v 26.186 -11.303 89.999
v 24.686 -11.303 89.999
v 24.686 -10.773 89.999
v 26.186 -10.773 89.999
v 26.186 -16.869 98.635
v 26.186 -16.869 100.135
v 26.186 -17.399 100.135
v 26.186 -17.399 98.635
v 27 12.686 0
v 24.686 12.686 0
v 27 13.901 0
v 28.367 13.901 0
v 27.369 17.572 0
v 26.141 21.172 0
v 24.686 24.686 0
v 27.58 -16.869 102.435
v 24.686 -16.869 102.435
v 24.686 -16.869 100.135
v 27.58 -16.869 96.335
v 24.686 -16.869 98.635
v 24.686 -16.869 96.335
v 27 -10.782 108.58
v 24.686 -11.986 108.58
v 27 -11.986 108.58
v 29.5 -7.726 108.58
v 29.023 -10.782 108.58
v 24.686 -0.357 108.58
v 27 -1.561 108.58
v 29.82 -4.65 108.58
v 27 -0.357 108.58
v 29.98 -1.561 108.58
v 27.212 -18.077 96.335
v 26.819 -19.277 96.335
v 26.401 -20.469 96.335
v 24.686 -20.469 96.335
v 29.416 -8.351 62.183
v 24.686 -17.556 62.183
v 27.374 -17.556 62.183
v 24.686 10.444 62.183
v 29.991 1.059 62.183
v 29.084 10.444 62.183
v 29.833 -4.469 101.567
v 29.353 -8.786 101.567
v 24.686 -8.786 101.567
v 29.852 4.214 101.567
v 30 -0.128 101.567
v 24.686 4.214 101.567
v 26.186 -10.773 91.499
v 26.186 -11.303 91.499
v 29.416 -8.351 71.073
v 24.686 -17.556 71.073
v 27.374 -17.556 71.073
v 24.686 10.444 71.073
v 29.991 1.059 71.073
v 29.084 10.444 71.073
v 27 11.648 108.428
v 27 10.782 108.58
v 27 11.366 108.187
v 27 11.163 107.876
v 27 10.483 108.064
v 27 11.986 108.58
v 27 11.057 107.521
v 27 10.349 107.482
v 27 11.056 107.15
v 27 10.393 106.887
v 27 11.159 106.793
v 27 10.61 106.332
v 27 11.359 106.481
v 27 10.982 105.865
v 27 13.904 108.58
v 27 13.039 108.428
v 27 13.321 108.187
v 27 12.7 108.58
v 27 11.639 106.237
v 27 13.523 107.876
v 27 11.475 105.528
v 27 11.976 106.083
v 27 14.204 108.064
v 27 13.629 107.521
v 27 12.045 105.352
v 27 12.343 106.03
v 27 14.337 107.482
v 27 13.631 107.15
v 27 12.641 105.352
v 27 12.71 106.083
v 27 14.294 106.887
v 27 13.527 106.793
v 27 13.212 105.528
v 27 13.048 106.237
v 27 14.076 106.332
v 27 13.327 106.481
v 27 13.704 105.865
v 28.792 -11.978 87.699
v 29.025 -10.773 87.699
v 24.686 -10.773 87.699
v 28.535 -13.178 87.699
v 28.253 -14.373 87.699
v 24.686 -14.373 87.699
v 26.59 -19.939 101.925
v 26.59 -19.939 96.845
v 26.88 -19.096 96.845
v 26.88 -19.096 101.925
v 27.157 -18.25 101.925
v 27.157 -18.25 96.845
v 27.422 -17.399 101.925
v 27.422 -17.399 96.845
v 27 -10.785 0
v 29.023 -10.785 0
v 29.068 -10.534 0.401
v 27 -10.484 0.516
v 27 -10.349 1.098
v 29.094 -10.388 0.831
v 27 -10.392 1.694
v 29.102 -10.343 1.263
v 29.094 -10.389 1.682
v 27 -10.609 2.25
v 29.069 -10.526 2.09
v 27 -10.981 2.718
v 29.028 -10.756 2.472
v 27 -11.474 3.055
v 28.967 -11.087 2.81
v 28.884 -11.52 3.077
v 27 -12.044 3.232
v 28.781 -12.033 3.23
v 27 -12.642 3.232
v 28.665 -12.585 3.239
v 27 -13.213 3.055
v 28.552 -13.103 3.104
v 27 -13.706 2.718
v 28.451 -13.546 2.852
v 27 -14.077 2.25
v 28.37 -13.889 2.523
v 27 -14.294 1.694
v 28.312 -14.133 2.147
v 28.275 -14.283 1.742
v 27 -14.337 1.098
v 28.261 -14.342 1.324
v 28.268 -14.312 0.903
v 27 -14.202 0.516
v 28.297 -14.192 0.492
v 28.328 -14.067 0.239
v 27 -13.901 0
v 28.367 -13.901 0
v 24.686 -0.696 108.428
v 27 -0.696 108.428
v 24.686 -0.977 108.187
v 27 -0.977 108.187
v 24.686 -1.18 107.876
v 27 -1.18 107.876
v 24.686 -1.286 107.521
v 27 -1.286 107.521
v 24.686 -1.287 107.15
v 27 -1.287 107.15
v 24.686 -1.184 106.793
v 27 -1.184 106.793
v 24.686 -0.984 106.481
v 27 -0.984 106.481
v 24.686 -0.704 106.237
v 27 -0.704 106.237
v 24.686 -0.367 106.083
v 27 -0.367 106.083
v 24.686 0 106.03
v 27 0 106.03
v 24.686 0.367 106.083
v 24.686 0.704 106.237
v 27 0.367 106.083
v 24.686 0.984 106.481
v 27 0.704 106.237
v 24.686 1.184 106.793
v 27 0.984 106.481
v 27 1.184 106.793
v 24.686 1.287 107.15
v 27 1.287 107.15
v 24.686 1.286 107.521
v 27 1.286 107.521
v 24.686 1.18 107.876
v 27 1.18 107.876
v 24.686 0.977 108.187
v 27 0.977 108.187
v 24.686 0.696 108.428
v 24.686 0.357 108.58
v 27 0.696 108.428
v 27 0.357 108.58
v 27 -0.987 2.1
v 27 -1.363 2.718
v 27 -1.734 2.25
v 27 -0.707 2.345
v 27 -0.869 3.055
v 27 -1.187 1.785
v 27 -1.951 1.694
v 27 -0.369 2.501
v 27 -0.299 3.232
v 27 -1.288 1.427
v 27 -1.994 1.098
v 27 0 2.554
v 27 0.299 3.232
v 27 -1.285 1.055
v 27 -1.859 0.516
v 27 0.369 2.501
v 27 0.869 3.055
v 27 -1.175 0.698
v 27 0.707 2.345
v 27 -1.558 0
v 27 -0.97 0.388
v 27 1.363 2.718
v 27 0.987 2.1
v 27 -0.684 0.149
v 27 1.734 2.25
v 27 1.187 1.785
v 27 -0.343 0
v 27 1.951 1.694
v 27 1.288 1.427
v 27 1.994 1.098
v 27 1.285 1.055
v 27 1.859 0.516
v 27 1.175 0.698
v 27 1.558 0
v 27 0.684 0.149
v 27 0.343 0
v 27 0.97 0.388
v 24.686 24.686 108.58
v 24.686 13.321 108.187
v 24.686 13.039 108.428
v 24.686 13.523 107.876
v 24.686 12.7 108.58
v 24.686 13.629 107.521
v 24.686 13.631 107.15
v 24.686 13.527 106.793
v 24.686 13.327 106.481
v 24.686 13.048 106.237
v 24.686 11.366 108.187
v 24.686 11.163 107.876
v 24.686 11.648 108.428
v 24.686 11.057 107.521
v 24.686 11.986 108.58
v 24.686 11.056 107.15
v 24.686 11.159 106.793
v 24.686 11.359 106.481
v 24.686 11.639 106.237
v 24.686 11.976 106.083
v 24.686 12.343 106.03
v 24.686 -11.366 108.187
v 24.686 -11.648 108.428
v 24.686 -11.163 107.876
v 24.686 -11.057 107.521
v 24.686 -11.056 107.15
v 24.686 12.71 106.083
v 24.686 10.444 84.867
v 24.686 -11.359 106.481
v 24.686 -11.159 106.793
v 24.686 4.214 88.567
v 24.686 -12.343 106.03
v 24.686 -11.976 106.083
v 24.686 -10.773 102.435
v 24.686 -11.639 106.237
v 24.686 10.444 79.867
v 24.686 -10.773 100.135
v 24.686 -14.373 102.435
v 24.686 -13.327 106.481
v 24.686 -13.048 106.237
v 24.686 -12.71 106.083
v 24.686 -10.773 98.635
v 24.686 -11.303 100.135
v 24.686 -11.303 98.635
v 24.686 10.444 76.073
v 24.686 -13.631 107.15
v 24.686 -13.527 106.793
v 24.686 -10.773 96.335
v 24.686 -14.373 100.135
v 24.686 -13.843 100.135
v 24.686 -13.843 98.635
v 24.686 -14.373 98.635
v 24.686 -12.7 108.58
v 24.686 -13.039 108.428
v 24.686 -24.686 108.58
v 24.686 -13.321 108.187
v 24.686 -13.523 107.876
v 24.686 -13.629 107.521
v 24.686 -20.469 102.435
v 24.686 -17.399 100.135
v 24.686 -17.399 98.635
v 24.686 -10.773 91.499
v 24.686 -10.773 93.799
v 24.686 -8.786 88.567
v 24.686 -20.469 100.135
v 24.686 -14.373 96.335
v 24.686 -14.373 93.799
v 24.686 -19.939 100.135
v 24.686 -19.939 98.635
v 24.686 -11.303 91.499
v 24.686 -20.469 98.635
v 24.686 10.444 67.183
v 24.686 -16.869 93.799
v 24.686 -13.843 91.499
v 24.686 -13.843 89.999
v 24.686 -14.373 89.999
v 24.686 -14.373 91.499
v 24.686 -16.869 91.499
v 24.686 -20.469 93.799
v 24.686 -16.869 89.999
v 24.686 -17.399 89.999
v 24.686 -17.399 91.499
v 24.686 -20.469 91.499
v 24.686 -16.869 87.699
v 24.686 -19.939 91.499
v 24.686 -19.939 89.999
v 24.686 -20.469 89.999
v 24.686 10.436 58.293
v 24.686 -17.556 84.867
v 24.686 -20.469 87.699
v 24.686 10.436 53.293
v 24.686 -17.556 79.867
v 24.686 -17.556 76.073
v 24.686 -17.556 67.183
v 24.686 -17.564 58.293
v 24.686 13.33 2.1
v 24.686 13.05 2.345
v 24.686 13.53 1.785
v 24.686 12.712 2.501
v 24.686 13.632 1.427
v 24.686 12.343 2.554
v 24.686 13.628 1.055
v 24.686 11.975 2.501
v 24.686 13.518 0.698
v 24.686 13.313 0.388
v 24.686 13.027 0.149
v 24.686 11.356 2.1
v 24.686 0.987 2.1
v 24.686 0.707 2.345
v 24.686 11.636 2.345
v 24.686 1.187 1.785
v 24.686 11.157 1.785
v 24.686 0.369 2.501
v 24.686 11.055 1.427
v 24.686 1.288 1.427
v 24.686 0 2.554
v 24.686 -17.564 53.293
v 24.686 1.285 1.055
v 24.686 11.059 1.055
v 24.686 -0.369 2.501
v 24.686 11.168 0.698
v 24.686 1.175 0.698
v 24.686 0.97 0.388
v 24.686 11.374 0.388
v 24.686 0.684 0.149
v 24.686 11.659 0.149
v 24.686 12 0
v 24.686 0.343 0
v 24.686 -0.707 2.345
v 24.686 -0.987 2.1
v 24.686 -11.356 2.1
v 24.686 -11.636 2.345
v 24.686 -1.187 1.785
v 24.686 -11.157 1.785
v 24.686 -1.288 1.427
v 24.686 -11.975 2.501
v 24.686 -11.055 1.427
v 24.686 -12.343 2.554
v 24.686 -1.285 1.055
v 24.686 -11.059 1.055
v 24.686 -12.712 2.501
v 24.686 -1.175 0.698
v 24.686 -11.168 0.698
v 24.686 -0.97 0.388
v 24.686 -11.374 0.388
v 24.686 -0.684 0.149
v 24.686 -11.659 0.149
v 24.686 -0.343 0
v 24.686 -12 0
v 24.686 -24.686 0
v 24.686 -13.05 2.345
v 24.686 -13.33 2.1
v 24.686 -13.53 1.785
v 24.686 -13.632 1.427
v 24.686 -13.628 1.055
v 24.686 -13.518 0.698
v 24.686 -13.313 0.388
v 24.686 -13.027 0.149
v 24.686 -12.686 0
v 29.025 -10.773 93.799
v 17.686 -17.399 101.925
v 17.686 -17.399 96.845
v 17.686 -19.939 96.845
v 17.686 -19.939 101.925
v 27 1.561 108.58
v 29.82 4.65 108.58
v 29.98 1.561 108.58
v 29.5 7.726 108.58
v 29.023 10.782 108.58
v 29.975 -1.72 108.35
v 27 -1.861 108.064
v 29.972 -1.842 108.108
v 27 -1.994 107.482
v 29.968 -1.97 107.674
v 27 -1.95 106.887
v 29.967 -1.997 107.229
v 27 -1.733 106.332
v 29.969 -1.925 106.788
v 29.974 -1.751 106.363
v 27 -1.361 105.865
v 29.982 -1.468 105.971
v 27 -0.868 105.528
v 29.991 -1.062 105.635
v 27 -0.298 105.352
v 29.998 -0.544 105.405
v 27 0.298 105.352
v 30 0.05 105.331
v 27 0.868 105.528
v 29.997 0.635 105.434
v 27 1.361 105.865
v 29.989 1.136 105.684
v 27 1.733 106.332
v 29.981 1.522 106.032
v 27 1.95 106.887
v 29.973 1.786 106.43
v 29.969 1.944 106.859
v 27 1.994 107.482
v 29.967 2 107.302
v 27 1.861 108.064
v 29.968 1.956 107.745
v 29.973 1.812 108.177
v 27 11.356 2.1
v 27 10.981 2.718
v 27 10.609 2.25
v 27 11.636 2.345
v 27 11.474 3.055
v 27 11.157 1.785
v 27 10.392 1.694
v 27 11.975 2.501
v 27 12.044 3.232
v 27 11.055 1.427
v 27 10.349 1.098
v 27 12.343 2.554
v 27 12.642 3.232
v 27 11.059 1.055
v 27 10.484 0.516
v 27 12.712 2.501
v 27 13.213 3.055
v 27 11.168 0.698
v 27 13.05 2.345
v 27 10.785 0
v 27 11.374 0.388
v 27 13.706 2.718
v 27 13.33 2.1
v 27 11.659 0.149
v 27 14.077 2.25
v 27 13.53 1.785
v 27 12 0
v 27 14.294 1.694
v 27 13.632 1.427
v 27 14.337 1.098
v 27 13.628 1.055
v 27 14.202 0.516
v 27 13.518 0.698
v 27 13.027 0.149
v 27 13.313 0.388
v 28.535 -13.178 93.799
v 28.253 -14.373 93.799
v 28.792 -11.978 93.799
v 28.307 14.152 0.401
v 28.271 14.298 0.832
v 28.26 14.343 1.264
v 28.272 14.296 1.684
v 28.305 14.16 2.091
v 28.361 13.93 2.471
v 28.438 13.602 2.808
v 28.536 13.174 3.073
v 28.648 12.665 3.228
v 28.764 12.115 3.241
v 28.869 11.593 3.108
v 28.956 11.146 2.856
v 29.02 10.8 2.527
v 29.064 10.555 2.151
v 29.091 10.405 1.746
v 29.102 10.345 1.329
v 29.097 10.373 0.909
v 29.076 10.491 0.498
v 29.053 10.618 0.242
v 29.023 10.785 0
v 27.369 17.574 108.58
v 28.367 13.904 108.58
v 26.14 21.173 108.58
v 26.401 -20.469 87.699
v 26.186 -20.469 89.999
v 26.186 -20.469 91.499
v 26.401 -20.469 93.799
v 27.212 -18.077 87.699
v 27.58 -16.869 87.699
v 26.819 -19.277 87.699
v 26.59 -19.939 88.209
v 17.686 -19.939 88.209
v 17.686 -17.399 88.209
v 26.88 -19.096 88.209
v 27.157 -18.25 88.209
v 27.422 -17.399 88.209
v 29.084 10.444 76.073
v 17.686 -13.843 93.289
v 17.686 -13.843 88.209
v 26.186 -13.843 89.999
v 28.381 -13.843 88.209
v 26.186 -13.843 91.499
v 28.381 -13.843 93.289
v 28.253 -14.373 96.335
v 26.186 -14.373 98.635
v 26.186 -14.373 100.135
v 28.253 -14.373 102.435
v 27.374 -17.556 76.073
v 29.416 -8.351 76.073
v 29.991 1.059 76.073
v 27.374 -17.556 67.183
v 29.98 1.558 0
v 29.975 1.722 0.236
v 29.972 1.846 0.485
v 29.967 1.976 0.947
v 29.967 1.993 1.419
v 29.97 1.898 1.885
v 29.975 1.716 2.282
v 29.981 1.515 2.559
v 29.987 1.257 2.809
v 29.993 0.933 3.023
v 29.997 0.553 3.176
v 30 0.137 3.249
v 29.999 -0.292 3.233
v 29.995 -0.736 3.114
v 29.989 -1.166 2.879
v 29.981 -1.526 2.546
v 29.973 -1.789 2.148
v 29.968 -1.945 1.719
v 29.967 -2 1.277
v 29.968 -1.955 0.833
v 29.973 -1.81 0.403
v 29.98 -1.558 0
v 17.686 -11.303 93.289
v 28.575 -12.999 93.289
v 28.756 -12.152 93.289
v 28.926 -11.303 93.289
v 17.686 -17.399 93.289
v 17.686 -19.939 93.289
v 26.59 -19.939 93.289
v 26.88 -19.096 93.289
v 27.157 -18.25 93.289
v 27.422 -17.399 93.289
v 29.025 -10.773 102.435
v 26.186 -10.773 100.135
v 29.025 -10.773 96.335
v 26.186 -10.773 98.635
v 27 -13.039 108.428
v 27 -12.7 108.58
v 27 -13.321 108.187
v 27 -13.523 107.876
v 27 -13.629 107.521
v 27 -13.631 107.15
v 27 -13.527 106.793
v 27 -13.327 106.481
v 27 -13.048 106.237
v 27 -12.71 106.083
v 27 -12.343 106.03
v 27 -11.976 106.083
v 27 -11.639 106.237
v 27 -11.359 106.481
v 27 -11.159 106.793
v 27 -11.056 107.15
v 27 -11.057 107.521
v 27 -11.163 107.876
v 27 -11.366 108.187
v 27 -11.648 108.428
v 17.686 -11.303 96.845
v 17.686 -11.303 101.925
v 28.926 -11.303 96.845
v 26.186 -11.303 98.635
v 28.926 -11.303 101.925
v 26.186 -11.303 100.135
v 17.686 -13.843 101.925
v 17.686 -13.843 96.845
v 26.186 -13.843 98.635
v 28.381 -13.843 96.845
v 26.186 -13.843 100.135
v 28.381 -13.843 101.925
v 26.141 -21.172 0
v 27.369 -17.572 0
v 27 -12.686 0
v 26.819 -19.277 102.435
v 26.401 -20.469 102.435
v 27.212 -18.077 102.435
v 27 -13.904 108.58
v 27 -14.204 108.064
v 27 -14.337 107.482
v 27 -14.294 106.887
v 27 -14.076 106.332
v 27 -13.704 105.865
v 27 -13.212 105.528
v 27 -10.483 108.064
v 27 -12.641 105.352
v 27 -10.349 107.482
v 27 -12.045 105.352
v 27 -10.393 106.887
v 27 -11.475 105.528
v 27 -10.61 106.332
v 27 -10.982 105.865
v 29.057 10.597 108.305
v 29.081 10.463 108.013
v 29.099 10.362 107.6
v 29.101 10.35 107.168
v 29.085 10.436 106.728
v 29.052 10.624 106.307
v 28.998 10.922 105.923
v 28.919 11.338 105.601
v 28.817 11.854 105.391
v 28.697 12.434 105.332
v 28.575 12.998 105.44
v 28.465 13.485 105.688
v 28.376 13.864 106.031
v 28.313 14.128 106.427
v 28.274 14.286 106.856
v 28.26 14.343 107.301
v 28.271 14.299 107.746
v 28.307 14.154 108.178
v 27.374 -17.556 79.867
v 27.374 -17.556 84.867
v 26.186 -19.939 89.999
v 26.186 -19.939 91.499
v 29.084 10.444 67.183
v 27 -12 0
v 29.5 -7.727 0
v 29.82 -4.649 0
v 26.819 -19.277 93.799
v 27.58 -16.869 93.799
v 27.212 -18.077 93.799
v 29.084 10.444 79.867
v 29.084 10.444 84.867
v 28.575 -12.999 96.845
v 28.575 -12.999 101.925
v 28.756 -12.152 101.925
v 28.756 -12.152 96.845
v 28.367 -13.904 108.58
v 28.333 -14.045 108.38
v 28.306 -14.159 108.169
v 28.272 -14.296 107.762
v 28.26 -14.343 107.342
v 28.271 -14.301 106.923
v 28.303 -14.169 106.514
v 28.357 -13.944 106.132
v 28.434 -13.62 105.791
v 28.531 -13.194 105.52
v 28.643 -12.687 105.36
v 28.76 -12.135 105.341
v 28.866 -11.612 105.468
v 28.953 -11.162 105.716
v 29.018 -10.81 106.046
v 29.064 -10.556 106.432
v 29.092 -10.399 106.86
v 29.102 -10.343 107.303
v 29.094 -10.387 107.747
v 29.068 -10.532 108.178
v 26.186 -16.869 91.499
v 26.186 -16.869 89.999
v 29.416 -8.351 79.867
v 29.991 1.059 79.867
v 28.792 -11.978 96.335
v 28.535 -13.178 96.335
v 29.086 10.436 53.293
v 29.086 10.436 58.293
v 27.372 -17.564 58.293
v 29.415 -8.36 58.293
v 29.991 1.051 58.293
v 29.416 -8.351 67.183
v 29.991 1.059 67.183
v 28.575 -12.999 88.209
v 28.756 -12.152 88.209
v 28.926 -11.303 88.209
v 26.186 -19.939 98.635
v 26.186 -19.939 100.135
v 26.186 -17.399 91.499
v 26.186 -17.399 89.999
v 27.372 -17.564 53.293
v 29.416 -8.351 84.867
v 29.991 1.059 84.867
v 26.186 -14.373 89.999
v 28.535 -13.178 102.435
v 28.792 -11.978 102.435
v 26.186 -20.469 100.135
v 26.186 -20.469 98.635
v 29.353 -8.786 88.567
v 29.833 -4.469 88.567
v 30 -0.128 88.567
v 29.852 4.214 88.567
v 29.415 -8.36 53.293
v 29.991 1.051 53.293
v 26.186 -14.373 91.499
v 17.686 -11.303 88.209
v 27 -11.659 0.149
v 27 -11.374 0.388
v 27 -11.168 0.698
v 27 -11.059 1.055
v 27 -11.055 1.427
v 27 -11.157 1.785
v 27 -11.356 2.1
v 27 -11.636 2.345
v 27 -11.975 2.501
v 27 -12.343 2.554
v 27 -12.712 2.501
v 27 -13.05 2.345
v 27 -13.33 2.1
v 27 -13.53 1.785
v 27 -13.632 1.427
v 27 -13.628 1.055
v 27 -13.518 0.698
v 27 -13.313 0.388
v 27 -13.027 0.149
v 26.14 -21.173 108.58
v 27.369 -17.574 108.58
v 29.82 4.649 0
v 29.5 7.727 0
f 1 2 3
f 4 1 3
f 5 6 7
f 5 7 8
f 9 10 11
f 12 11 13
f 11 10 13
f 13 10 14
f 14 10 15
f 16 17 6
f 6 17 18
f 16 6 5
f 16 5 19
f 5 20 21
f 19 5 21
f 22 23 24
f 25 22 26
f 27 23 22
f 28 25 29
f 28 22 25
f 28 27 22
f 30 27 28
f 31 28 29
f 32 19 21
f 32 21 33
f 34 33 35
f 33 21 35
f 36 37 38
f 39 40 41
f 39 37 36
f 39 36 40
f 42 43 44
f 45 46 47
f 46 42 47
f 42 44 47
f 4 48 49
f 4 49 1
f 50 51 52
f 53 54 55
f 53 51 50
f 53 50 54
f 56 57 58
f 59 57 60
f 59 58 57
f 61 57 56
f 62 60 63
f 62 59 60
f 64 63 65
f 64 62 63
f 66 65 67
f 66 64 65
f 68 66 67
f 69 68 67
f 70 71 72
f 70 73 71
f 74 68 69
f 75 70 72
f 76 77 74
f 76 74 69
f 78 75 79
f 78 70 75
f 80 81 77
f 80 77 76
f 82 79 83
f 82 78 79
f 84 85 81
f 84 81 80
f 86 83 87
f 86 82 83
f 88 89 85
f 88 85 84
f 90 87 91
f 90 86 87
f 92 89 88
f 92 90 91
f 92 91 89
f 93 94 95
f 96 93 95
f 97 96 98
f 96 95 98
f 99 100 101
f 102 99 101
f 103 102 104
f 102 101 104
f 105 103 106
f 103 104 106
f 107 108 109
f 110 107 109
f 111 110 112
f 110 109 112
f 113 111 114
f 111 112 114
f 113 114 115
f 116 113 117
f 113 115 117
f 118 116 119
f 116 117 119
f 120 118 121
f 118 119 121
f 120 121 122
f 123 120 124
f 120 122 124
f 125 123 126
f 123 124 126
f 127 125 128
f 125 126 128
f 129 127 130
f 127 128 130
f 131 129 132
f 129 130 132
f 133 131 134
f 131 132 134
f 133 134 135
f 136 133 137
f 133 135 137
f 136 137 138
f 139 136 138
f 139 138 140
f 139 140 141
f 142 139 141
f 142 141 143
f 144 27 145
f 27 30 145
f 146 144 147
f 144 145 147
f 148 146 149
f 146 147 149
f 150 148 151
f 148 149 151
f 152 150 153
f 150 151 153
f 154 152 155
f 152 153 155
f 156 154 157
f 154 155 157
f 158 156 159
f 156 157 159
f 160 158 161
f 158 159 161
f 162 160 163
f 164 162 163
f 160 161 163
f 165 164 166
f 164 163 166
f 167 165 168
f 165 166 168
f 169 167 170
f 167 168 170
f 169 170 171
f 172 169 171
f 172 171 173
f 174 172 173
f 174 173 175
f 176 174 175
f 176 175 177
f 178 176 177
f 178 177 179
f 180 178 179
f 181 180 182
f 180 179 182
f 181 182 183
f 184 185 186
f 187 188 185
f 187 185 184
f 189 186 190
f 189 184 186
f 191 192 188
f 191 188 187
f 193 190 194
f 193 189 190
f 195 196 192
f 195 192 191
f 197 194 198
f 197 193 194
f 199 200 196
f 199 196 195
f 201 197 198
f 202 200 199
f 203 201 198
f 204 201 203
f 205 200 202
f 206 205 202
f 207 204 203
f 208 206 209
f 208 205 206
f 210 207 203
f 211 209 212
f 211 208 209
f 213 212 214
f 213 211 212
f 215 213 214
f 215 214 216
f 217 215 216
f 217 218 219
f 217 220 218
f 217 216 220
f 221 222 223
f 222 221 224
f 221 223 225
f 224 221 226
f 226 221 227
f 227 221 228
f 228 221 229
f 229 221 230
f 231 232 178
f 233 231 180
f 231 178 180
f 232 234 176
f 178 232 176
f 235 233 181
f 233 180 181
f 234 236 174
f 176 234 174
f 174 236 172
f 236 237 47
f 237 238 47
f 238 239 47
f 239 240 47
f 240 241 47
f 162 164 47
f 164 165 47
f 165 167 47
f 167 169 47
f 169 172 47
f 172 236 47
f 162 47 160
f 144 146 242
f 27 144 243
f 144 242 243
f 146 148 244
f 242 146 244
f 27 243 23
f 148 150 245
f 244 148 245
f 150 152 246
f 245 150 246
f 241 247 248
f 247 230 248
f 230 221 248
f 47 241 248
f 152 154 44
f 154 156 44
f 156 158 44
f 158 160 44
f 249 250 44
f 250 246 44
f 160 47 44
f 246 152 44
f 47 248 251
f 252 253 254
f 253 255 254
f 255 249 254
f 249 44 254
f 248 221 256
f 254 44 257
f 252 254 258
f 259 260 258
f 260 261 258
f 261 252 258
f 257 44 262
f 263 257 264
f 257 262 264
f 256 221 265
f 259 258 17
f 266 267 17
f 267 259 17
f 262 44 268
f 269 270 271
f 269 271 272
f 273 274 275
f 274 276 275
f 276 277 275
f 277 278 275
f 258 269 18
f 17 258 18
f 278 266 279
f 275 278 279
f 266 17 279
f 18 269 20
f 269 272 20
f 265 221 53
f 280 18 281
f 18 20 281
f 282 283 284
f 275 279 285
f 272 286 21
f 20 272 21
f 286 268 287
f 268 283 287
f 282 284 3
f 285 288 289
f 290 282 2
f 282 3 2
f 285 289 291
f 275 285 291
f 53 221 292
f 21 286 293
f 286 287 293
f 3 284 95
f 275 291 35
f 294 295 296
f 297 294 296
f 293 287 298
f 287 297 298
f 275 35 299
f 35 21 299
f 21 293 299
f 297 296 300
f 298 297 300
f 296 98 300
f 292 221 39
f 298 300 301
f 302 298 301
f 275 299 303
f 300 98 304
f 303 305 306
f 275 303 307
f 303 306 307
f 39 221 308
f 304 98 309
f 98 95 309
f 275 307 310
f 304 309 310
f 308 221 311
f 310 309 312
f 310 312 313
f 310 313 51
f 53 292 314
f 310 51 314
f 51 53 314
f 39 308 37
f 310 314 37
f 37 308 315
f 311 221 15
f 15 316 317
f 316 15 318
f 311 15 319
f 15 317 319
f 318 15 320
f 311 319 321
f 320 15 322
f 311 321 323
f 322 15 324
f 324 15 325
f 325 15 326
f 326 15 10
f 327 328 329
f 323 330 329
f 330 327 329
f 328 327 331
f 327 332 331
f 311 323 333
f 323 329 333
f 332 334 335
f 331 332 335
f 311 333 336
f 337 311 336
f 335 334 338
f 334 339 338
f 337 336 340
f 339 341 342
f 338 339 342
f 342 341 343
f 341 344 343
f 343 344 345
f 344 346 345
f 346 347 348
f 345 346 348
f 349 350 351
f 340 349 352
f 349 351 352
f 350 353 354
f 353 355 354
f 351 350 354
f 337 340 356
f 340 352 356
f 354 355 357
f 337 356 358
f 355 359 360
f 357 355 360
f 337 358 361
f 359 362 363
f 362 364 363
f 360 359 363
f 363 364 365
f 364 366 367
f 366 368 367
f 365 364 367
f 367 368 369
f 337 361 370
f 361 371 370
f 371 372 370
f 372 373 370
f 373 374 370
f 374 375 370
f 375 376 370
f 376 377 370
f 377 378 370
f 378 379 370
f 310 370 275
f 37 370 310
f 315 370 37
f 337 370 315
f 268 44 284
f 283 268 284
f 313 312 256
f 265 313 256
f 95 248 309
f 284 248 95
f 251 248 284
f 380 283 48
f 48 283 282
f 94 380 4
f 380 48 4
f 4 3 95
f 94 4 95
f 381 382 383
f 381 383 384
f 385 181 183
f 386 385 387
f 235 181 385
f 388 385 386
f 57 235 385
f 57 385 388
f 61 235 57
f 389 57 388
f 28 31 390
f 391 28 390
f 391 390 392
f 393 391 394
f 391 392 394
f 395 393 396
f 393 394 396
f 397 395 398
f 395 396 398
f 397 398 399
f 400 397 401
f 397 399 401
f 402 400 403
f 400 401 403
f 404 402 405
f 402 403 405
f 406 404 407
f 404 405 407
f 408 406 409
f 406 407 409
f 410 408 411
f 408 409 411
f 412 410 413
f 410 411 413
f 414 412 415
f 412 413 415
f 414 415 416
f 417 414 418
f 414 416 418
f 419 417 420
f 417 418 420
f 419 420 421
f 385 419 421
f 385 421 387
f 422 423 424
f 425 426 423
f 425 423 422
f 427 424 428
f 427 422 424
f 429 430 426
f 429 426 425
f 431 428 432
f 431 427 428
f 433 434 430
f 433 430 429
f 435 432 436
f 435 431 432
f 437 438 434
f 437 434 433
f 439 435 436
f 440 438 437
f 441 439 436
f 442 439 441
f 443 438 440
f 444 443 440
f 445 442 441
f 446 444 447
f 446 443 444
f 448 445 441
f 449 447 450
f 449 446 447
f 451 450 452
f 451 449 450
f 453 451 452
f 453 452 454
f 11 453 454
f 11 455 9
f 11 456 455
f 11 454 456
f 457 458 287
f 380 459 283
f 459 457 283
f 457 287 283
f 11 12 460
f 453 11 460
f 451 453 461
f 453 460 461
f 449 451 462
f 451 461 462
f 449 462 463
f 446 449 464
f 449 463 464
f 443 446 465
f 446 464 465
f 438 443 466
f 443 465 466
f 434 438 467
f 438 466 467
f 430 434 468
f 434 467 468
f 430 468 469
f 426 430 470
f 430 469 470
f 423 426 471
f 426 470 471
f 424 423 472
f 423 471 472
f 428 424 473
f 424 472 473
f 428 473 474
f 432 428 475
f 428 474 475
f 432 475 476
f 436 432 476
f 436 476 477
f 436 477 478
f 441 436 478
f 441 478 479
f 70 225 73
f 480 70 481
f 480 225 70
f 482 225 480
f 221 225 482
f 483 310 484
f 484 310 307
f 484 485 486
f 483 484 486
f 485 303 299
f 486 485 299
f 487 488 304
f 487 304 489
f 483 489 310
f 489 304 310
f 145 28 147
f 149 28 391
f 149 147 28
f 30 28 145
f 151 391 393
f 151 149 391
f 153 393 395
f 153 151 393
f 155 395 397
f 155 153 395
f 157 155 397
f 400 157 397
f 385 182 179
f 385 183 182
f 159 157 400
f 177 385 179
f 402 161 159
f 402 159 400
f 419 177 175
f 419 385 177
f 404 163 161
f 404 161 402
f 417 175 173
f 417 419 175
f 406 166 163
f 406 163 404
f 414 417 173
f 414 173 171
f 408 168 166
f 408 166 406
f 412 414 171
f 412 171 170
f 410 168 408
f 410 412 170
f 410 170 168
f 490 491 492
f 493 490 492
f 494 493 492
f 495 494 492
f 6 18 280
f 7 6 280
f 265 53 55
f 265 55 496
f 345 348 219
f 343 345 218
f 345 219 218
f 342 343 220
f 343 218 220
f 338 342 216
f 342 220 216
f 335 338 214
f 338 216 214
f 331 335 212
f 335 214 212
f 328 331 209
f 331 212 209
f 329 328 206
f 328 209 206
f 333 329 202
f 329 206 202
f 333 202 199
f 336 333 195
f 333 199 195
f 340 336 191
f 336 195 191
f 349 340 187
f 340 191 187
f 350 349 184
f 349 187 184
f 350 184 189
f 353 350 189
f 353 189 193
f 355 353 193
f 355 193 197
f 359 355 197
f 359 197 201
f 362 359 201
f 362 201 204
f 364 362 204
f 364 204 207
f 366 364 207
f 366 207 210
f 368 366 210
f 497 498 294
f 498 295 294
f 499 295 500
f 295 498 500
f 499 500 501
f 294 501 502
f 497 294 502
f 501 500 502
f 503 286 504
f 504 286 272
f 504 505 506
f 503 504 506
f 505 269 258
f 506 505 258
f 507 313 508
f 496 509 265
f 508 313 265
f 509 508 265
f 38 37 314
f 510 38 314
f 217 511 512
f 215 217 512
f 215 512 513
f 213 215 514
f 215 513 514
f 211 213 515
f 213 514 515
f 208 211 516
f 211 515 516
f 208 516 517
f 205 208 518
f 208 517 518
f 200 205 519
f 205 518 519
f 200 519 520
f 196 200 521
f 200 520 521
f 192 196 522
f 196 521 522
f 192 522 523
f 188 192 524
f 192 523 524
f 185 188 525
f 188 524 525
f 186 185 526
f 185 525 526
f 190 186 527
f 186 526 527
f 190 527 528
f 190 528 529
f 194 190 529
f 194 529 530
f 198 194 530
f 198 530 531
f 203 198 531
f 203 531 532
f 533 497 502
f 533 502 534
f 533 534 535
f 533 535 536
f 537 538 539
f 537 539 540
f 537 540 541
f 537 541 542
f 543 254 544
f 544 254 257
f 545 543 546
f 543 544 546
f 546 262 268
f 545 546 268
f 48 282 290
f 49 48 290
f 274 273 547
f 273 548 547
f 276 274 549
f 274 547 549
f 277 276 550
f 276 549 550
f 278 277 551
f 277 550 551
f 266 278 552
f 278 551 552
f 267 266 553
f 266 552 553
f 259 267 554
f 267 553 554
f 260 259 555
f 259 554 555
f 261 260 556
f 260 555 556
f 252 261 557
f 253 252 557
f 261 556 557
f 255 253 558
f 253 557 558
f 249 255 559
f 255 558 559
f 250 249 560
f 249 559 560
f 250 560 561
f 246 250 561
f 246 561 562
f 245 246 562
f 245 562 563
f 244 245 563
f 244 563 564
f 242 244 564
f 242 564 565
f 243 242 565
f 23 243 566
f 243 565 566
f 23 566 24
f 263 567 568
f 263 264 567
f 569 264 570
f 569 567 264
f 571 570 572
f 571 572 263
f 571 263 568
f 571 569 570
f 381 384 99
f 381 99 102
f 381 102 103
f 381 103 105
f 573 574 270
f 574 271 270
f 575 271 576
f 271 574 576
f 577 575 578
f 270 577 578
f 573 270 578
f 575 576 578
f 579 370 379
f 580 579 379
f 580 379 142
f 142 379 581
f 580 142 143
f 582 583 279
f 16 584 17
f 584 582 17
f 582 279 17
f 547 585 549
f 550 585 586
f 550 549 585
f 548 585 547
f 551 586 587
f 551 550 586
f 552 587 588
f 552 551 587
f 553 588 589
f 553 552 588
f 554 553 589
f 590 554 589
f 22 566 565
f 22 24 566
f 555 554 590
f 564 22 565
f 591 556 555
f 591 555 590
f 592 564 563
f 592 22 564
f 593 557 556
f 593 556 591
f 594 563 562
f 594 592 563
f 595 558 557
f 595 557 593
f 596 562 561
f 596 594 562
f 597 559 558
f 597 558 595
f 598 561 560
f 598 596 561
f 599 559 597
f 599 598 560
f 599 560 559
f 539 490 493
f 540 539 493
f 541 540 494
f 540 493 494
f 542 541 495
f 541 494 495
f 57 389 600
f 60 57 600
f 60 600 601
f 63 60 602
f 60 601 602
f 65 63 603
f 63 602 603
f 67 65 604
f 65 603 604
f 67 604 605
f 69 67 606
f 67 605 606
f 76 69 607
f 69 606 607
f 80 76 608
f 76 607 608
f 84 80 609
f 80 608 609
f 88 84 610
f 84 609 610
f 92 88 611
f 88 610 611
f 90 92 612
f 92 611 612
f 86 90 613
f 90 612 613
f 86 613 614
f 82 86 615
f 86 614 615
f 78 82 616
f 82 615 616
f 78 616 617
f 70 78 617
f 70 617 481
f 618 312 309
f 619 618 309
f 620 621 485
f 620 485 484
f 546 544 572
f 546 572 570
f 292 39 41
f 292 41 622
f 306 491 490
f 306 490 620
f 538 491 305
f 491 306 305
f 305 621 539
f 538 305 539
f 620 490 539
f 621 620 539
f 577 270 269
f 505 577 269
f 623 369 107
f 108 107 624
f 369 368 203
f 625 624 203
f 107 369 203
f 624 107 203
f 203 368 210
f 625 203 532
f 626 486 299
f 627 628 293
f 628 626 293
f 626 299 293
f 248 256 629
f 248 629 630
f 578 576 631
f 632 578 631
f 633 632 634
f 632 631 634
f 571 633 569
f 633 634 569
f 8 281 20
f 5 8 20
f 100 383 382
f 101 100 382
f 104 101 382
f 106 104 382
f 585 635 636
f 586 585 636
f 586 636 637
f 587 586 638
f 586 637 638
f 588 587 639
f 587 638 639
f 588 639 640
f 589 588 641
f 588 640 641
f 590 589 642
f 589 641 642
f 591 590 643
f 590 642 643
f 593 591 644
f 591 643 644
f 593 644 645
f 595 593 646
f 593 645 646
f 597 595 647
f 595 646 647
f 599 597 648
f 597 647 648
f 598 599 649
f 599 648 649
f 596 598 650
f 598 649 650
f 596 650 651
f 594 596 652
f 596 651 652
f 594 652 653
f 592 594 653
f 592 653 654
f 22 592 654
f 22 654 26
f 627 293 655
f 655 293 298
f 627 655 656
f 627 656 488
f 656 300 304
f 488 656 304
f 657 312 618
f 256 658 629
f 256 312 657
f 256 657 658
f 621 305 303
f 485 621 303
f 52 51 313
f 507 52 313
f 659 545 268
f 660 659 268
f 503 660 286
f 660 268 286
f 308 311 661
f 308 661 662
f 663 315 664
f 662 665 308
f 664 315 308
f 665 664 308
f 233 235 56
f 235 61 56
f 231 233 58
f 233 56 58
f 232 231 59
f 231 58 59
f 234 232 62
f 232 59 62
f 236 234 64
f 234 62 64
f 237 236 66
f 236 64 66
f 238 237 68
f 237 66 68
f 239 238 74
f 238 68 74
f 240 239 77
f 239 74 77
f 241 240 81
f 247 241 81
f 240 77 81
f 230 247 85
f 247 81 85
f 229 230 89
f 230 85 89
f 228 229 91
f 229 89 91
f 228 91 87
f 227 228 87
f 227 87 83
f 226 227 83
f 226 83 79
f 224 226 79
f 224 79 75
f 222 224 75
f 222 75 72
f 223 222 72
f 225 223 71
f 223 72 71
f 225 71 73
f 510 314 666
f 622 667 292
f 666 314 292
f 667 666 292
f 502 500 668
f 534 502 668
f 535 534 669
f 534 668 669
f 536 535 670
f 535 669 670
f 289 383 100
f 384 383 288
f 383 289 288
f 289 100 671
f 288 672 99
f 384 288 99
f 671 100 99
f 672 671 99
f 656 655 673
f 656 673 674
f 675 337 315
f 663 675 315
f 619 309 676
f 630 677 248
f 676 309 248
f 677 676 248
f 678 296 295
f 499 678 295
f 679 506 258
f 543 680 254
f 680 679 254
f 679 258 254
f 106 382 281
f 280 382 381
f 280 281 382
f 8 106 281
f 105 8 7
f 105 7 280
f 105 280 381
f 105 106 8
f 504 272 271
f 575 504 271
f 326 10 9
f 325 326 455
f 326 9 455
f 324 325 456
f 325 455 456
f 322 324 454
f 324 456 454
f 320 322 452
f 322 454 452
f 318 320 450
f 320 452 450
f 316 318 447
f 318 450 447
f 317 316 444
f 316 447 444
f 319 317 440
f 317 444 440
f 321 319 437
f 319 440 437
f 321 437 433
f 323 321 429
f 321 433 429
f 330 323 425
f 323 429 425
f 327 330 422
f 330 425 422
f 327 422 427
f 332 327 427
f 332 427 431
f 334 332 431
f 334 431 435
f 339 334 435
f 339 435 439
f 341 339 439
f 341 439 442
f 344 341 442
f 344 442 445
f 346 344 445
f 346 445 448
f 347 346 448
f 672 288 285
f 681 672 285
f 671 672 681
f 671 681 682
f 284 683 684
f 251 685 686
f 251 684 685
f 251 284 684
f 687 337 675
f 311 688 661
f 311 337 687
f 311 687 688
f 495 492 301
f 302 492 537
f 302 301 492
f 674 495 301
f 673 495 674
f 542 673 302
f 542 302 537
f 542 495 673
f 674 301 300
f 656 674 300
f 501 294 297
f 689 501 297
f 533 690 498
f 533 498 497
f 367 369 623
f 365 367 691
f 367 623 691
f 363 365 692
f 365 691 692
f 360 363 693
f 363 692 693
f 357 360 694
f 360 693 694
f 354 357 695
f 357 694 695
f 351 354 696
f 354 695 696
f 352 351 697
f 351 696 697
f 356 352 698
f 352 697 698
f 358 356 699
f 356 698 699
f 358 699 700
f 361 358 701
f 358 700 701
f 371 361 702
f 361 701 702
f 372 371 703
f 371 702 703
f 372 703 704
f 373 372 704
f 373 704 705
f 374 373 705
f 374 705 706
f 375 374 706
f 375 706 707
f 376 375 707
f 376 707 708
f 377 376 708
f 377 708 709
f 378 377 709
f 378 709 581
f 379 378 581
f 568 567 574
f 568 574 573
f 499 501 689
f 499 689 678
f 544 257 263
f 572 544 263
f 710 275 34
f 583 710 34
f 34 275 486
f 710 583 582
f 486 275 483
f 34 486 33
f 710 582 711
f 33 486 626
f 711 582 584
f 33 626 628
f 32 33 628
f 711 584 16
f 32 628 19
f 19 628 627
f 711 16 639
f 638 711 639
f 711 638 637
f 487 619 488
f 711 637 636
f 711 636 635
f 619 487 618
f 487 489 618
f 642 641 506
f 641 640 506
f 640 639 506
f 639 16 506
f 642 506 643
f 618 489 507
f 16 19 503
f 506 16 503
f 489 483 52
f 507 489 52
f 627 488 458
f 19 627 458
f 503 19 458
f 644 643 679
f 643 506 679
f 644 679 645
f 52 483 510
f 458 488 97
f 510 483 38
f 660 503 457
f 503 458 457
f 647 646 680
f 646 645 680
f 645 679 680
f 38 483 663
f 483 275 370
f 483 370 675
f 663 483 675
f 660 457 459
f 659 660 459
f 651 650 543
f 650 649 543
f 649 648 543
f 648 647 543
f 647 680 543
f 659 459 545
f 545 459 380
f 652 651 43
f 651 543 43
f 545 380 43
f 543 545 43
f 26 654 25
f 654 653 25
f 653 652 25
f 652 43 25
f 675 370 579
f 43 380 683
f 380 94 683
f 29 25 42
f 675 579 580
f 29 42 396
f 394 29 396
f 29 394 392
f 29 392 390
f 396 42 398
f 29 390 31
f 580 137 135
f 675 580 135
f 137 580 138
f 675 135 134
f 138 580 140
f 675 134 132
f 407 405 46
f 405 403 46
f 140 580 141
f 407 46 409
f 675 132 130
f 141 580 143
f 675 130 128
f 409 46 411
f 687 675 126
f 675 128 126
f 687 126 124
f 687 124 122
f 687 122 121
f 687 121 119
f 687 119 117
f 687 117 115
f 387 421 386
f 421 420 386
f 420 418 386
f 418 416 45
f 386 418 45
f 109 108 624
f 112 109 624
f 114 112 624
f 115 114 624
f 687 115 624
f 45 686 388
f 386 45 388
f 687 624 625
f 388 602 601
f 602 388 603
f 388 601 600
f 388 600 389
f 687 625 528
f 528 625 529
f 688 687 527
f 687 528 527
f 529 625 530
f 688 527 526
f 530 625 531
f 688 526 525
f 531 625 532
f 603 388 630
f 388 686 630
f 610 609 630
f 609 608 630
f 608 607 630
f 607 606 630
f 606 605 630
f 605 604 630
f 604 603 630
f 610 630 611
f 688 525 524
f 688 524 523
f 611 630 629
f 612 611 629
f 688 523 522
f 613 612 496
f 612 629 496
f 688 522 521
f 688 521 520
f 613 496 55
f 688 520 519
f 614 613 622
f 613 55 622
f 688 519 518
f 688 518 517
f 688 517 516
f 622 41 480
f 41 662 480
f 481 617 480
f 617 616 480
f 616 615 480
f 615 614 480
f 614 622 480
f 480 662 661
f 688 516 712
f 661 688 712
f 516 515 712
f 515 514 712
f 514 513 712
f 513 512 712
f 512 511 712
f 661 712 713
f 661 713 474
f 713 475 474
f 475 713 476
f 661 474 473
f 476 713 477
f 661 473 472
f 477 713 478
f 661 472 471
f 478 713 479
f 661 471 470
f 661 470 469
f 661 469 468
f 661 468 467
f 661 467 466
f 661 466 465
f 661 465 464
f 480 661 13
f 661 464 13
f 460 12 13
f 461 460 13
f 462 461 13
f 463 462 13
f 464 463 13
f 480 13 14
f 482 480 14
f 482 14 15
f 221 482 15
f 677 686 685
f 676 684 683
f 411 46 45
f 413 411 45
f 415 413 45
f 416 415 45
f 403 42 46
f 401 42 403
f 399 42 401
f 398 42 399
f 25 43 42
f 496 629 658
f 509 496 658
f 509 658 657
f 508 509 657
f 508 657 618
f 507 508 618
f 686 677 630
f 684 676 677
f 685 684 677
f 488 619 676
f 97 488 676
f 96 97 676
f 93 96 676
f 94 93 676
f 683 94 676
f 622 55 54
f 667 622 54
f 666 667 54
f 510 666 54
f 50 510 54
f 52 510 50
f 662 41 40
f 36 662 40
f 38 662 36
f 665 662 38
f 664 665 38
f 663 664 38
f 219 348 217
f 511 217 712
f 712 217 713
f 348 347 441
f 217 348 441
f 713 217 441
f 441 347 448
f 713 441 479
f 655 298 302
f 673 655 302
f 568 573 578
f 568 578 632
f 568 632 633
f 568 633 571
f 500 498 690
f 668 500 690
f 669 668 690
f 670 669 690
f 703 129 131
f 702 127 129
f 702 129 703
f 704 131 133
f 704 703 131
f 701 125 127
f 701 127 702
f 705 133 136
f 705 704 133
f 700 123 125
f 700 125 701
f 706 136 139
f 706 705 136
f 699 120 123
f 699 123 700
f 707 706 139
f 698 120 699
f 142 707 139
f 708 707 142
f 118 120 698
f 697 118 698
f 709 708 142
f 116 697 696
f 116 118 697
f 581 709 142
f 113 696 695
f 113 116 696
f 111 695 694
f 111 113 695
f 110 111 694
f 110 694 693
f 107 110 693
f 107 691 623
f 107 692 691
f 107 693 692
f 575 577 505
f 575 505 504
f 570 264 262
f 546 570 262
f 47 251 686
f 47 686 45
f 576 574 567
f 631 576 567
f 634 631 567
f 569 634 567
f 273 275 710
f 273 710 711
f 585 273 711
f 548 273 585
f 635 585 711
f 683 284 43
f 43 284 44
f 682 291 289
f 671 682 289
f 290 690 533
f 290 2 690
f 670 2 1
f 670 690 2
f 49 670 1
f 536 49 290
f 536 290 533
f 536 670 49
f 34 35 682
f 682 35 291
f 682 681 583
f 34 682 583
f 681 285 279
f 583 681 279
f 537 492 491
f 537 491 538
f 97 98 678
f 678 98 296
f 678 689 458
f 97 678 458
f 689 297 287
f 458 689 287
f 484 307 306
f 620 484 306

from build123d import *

# Parameters (mm, degrees)
EXTRUDE_1_DEPTH     = 108.58
SKETCH_11_R         = 2
CUT_EXTRUDE_4_DEPTH = 3
SKETCH_12_R         = 1.3
CUT_EXTRUDE_5_DEPTH = 14
SKETCH_15_W         = 13
SKETCH_15_H         = 13
SKETCH_15_W_2       = 5
SKETCH_15_H_2       = 28
CUT_EXTRUDE_6_DEPTH = 10
CUT_EXTRUDE_7_DEPTH = 10
SKETCH_17_W         = 1.5
SKETCH_17_H         = 0.5299964
SKETCH_17_H_2       = 0.5300218
CUT_EXTRUDE_8_DEPTH = 3.813730334
SKETCH_18_W         = 5.08
SKETCH_18_H         = 2.54
EXTRUDE_2_DEPTH     = 7


with BuildPart() as part:
    # 草图3 → 凸台-拉伸1 (new body)
    with BuildSketch(Plane.XY):
        with BuildLine():
            Line((24.686269666, 24.686269666), (24.686269666, -24.686269666))
            ThreePointArc((24.686269666, -24.686269666), (30, 0), (24.686269666, 24.686269666))
        make_face()
    extrude(amount=EXTRUDE_1_DEPTH)

    # 草图11 → 切除-拉伸4 (cut)
    with BuildSketch(Plane(origin=(30, 0, 0), x_dir=(0, 0, -1), z_dir=(1, 0, 0))):
        with Locations((-1.254, -12.343134833)):
            Circle(SKETCH_11_R)
        with Locations((-1.254, 0)):
            Circle(SKETCH_11_R)
        with Locations((-1.254, 12.343134833)):
            Circle(SKETCH_11_R)
        with Locations((-107.33, -12.343134833)):
            Circle(SKETCH_11_R)
        with Locations((-107.33, 0)):
            Circle(SKETCH_11_R)
        with Locations((-107.33, 12.343134833)):
            Circle(SKETCH_11_R)
    extrude(amount=-CUT_EXTRUDE_4_DEPTH, mode=Mode.SUBTRACT)

    # 草图12 → 切除-拉伸5 (cut)
    with BuildSketch(Plane(origin=(27, 0, 0), x_dir=(0, 0, -1), z_dir=(1, 0, 0))):
        with Locations((-1.254, -12.343134833)):
            Circle(SKETCH_12_R)
        with Locations((-1.254, 0)):
            Circle(SKETCH_12_R)
        with Locations((-1.254, 12.343134833)):
            Circle(SKETCH_12_R)
        with Locations((-107.33, 12.343134833)):
            Circle(SKETCH_12_R)
        with Locations((-107.33, 0)):
            Circle(SKETCH_12_R)
        with Locations((-107.33, -12.343134833)):
            Circle(SKETCH_12_R)
    extrude(amount=-CUT_EXTRUDE_5_DEPTH, mode=Mode.SUBTRACT)

    # 草图15 → 切除-拉伸6 (cut)
    with BuildSketch(Plane.ZY.offset(-24.686269666)):
        with Locations((95.066746, -2.286)):
            Rectangle(SKETCH_15_W, SKETCH_15_H)
        with Locations((82.3670381, -3.555929665)):
            Rectangle(SKETCH_15_W_2, SKETCH_15_H_2)
        with Locations((73.5725421, -3.556070335)):
            Rectangle(SKETCH_15_W_2, SKETCH_15_H_2)
        with Locations((64.6825421, -3.555934352)):
            Rectangle(SKETCH_15_W_2, SKETCH_15_H_2)
        with Locations((55.7925421, -3.564457152)):
            Rectangle(SKETCH_15_W_2, SKETCH_15_H_2)
    extrude(amount=-CUT_EXTRUDE_6_DEPTH, mode=Mode.SUBTRACT)

    # 草图16 → 切除-拉伸7 (cut)
    with BuildSketch(Plane.ZY.offset(-24.686269666)):
        Polygon((100.135, -10.7730036), (100.135, -11.303), (101.925, -11.303), (101.925, -13.843), (100.135, -13.843), (100.135, -14.3730218), (102.4349812, -14.3730218), (102.4349812, -10.7730036), align=None)
        Polygon((96.3349934, -10.7730036), (96.3349934, -14.3730218), (98.635, -14.3730218), (98.635, -13.843), (96.845, -13.843), (96.845, -11.303), (98.635, -11.303), (98.635, -10.7730036), align=None)
        Polygon((102.4349812, -16.8690036), (100.135, -16.8690036), (100.135, -17.399), (101.925, -17.399), (101.925, -19.939), (100.135, -19.939), (100.135, -20.4690218), (102.4349812, -20.4690218), align=None)
        Polygon((96.3349934, -16.8690036), (96.3349934, -20.4690218), (98.635, -20.4690218), (98.635, -19.939), (96.845, -19.939), (96.845, -17.399), (98.635, -17.399), (98.635, -16.8690036), align=None)
        Polygon((93.7989812, -10.7730036), (91.499, -10.7730036), (91.499, -11.303), (93.289, -11.303), (93.289, -13.843), (91.499, -13.843), (91.499, -14.3730218), (93.7989812, -14.3730218), align=None)
        Polygon((87.6989934, -10.7730036), (87.6989934, -14.3730218), (89.999, -14.3730218), (89.999, -13.843), (88.209, -13.843), (88.209, -11.303), (89.999, -11.303), (89.999, -10.7730036), align=None)
        Polygon((93.7989812, -16.8690036), (91.499, -16.8690036), (91.499, -17.399), (93.289, -17.399), (93.289, -19.939), (91.499, -19.939), (91.499, -20.4690218), (93.7989812, -20.4690218), align=None)
        Polygon((87.6989934, -16.8690036), (87.6989934, -20.4690218), (89.999, -20.4690218), (89.999, -19.939), (88.209, -19.939), (88.209, -17.399), (89.999, -17.399), (89.999, -16.8690036), align=None)
    extrude(amount=-CUT_EXTRUDE_7_DEPTH, mode=Mode.SUBTRACT)

    # 草图17 → 切除-拉伸8 (cut)
    with BuildSketch(Plane(origin=(30, 0, 0), x_dir=(0, 0, -1), z_dir=(1, 0, 0))):
        with Locations((-99.385, -11.0380018)):
            Rectangle(SKETCH_17_W, SKETCH_17_H)
        with Locations((-99.385, -14.1080109)):
            Rectangle(SKETCH_17_W, SKETCH_17_H_2)
        with Locations((-99.385, -17.1340018)):
            Rectangle(SKETCH_17_W, SKETCH_17_H)
        with Locations((-99.385, -20.2040109)):
            Rectangle(SKETCH_17_W, SKETCH_17_H_2)
        with Locations((-90.749, -17.1340018)):
            Rectangle(SKETCH_17_W, SKETCH_17_H)
        with Locations((-90.749, -20.2040109)):
            Rectangle(SKETCH_17_W, SKETCH_17_H_2)
        with Locations((-90.749, -11.0380018)):
            Rectangle(SKETCH_17_W, SKETCH_17_H)
        with Locations((-90.749, -14.1080109)):
            Rectangle(SKETCH_17_W, SKETCH_17_H_2)
    extrude(amount=-CUT_EXTRUDE_8_DEPTH, mode=Mode.SUBTRACT)

    # 草图18 → 凸台-拉伸2 (add)
    with BuildSketch(Plane.ZY.offset(-24.686269666)):
        with Locations((90.749, -12.573)):
            Rectangle(SKETCH_18_W, SKETCH_18_H)
        with Locations((90.749, -18.669)):
            Rectangle(SKETCH_18_W, SKETCH_18_H)
        with Locations((99.385, -12.573)):
            Rectangle(SKETCH_18_W, SKETCH_18_H)
        with Locations((99.385, -18.669)):
            Rectangle(SKETCH_18_W, SKETCH_18_H)
    extrude(amount=EXTRUDE_2_DEPTH)


solid = part.part
